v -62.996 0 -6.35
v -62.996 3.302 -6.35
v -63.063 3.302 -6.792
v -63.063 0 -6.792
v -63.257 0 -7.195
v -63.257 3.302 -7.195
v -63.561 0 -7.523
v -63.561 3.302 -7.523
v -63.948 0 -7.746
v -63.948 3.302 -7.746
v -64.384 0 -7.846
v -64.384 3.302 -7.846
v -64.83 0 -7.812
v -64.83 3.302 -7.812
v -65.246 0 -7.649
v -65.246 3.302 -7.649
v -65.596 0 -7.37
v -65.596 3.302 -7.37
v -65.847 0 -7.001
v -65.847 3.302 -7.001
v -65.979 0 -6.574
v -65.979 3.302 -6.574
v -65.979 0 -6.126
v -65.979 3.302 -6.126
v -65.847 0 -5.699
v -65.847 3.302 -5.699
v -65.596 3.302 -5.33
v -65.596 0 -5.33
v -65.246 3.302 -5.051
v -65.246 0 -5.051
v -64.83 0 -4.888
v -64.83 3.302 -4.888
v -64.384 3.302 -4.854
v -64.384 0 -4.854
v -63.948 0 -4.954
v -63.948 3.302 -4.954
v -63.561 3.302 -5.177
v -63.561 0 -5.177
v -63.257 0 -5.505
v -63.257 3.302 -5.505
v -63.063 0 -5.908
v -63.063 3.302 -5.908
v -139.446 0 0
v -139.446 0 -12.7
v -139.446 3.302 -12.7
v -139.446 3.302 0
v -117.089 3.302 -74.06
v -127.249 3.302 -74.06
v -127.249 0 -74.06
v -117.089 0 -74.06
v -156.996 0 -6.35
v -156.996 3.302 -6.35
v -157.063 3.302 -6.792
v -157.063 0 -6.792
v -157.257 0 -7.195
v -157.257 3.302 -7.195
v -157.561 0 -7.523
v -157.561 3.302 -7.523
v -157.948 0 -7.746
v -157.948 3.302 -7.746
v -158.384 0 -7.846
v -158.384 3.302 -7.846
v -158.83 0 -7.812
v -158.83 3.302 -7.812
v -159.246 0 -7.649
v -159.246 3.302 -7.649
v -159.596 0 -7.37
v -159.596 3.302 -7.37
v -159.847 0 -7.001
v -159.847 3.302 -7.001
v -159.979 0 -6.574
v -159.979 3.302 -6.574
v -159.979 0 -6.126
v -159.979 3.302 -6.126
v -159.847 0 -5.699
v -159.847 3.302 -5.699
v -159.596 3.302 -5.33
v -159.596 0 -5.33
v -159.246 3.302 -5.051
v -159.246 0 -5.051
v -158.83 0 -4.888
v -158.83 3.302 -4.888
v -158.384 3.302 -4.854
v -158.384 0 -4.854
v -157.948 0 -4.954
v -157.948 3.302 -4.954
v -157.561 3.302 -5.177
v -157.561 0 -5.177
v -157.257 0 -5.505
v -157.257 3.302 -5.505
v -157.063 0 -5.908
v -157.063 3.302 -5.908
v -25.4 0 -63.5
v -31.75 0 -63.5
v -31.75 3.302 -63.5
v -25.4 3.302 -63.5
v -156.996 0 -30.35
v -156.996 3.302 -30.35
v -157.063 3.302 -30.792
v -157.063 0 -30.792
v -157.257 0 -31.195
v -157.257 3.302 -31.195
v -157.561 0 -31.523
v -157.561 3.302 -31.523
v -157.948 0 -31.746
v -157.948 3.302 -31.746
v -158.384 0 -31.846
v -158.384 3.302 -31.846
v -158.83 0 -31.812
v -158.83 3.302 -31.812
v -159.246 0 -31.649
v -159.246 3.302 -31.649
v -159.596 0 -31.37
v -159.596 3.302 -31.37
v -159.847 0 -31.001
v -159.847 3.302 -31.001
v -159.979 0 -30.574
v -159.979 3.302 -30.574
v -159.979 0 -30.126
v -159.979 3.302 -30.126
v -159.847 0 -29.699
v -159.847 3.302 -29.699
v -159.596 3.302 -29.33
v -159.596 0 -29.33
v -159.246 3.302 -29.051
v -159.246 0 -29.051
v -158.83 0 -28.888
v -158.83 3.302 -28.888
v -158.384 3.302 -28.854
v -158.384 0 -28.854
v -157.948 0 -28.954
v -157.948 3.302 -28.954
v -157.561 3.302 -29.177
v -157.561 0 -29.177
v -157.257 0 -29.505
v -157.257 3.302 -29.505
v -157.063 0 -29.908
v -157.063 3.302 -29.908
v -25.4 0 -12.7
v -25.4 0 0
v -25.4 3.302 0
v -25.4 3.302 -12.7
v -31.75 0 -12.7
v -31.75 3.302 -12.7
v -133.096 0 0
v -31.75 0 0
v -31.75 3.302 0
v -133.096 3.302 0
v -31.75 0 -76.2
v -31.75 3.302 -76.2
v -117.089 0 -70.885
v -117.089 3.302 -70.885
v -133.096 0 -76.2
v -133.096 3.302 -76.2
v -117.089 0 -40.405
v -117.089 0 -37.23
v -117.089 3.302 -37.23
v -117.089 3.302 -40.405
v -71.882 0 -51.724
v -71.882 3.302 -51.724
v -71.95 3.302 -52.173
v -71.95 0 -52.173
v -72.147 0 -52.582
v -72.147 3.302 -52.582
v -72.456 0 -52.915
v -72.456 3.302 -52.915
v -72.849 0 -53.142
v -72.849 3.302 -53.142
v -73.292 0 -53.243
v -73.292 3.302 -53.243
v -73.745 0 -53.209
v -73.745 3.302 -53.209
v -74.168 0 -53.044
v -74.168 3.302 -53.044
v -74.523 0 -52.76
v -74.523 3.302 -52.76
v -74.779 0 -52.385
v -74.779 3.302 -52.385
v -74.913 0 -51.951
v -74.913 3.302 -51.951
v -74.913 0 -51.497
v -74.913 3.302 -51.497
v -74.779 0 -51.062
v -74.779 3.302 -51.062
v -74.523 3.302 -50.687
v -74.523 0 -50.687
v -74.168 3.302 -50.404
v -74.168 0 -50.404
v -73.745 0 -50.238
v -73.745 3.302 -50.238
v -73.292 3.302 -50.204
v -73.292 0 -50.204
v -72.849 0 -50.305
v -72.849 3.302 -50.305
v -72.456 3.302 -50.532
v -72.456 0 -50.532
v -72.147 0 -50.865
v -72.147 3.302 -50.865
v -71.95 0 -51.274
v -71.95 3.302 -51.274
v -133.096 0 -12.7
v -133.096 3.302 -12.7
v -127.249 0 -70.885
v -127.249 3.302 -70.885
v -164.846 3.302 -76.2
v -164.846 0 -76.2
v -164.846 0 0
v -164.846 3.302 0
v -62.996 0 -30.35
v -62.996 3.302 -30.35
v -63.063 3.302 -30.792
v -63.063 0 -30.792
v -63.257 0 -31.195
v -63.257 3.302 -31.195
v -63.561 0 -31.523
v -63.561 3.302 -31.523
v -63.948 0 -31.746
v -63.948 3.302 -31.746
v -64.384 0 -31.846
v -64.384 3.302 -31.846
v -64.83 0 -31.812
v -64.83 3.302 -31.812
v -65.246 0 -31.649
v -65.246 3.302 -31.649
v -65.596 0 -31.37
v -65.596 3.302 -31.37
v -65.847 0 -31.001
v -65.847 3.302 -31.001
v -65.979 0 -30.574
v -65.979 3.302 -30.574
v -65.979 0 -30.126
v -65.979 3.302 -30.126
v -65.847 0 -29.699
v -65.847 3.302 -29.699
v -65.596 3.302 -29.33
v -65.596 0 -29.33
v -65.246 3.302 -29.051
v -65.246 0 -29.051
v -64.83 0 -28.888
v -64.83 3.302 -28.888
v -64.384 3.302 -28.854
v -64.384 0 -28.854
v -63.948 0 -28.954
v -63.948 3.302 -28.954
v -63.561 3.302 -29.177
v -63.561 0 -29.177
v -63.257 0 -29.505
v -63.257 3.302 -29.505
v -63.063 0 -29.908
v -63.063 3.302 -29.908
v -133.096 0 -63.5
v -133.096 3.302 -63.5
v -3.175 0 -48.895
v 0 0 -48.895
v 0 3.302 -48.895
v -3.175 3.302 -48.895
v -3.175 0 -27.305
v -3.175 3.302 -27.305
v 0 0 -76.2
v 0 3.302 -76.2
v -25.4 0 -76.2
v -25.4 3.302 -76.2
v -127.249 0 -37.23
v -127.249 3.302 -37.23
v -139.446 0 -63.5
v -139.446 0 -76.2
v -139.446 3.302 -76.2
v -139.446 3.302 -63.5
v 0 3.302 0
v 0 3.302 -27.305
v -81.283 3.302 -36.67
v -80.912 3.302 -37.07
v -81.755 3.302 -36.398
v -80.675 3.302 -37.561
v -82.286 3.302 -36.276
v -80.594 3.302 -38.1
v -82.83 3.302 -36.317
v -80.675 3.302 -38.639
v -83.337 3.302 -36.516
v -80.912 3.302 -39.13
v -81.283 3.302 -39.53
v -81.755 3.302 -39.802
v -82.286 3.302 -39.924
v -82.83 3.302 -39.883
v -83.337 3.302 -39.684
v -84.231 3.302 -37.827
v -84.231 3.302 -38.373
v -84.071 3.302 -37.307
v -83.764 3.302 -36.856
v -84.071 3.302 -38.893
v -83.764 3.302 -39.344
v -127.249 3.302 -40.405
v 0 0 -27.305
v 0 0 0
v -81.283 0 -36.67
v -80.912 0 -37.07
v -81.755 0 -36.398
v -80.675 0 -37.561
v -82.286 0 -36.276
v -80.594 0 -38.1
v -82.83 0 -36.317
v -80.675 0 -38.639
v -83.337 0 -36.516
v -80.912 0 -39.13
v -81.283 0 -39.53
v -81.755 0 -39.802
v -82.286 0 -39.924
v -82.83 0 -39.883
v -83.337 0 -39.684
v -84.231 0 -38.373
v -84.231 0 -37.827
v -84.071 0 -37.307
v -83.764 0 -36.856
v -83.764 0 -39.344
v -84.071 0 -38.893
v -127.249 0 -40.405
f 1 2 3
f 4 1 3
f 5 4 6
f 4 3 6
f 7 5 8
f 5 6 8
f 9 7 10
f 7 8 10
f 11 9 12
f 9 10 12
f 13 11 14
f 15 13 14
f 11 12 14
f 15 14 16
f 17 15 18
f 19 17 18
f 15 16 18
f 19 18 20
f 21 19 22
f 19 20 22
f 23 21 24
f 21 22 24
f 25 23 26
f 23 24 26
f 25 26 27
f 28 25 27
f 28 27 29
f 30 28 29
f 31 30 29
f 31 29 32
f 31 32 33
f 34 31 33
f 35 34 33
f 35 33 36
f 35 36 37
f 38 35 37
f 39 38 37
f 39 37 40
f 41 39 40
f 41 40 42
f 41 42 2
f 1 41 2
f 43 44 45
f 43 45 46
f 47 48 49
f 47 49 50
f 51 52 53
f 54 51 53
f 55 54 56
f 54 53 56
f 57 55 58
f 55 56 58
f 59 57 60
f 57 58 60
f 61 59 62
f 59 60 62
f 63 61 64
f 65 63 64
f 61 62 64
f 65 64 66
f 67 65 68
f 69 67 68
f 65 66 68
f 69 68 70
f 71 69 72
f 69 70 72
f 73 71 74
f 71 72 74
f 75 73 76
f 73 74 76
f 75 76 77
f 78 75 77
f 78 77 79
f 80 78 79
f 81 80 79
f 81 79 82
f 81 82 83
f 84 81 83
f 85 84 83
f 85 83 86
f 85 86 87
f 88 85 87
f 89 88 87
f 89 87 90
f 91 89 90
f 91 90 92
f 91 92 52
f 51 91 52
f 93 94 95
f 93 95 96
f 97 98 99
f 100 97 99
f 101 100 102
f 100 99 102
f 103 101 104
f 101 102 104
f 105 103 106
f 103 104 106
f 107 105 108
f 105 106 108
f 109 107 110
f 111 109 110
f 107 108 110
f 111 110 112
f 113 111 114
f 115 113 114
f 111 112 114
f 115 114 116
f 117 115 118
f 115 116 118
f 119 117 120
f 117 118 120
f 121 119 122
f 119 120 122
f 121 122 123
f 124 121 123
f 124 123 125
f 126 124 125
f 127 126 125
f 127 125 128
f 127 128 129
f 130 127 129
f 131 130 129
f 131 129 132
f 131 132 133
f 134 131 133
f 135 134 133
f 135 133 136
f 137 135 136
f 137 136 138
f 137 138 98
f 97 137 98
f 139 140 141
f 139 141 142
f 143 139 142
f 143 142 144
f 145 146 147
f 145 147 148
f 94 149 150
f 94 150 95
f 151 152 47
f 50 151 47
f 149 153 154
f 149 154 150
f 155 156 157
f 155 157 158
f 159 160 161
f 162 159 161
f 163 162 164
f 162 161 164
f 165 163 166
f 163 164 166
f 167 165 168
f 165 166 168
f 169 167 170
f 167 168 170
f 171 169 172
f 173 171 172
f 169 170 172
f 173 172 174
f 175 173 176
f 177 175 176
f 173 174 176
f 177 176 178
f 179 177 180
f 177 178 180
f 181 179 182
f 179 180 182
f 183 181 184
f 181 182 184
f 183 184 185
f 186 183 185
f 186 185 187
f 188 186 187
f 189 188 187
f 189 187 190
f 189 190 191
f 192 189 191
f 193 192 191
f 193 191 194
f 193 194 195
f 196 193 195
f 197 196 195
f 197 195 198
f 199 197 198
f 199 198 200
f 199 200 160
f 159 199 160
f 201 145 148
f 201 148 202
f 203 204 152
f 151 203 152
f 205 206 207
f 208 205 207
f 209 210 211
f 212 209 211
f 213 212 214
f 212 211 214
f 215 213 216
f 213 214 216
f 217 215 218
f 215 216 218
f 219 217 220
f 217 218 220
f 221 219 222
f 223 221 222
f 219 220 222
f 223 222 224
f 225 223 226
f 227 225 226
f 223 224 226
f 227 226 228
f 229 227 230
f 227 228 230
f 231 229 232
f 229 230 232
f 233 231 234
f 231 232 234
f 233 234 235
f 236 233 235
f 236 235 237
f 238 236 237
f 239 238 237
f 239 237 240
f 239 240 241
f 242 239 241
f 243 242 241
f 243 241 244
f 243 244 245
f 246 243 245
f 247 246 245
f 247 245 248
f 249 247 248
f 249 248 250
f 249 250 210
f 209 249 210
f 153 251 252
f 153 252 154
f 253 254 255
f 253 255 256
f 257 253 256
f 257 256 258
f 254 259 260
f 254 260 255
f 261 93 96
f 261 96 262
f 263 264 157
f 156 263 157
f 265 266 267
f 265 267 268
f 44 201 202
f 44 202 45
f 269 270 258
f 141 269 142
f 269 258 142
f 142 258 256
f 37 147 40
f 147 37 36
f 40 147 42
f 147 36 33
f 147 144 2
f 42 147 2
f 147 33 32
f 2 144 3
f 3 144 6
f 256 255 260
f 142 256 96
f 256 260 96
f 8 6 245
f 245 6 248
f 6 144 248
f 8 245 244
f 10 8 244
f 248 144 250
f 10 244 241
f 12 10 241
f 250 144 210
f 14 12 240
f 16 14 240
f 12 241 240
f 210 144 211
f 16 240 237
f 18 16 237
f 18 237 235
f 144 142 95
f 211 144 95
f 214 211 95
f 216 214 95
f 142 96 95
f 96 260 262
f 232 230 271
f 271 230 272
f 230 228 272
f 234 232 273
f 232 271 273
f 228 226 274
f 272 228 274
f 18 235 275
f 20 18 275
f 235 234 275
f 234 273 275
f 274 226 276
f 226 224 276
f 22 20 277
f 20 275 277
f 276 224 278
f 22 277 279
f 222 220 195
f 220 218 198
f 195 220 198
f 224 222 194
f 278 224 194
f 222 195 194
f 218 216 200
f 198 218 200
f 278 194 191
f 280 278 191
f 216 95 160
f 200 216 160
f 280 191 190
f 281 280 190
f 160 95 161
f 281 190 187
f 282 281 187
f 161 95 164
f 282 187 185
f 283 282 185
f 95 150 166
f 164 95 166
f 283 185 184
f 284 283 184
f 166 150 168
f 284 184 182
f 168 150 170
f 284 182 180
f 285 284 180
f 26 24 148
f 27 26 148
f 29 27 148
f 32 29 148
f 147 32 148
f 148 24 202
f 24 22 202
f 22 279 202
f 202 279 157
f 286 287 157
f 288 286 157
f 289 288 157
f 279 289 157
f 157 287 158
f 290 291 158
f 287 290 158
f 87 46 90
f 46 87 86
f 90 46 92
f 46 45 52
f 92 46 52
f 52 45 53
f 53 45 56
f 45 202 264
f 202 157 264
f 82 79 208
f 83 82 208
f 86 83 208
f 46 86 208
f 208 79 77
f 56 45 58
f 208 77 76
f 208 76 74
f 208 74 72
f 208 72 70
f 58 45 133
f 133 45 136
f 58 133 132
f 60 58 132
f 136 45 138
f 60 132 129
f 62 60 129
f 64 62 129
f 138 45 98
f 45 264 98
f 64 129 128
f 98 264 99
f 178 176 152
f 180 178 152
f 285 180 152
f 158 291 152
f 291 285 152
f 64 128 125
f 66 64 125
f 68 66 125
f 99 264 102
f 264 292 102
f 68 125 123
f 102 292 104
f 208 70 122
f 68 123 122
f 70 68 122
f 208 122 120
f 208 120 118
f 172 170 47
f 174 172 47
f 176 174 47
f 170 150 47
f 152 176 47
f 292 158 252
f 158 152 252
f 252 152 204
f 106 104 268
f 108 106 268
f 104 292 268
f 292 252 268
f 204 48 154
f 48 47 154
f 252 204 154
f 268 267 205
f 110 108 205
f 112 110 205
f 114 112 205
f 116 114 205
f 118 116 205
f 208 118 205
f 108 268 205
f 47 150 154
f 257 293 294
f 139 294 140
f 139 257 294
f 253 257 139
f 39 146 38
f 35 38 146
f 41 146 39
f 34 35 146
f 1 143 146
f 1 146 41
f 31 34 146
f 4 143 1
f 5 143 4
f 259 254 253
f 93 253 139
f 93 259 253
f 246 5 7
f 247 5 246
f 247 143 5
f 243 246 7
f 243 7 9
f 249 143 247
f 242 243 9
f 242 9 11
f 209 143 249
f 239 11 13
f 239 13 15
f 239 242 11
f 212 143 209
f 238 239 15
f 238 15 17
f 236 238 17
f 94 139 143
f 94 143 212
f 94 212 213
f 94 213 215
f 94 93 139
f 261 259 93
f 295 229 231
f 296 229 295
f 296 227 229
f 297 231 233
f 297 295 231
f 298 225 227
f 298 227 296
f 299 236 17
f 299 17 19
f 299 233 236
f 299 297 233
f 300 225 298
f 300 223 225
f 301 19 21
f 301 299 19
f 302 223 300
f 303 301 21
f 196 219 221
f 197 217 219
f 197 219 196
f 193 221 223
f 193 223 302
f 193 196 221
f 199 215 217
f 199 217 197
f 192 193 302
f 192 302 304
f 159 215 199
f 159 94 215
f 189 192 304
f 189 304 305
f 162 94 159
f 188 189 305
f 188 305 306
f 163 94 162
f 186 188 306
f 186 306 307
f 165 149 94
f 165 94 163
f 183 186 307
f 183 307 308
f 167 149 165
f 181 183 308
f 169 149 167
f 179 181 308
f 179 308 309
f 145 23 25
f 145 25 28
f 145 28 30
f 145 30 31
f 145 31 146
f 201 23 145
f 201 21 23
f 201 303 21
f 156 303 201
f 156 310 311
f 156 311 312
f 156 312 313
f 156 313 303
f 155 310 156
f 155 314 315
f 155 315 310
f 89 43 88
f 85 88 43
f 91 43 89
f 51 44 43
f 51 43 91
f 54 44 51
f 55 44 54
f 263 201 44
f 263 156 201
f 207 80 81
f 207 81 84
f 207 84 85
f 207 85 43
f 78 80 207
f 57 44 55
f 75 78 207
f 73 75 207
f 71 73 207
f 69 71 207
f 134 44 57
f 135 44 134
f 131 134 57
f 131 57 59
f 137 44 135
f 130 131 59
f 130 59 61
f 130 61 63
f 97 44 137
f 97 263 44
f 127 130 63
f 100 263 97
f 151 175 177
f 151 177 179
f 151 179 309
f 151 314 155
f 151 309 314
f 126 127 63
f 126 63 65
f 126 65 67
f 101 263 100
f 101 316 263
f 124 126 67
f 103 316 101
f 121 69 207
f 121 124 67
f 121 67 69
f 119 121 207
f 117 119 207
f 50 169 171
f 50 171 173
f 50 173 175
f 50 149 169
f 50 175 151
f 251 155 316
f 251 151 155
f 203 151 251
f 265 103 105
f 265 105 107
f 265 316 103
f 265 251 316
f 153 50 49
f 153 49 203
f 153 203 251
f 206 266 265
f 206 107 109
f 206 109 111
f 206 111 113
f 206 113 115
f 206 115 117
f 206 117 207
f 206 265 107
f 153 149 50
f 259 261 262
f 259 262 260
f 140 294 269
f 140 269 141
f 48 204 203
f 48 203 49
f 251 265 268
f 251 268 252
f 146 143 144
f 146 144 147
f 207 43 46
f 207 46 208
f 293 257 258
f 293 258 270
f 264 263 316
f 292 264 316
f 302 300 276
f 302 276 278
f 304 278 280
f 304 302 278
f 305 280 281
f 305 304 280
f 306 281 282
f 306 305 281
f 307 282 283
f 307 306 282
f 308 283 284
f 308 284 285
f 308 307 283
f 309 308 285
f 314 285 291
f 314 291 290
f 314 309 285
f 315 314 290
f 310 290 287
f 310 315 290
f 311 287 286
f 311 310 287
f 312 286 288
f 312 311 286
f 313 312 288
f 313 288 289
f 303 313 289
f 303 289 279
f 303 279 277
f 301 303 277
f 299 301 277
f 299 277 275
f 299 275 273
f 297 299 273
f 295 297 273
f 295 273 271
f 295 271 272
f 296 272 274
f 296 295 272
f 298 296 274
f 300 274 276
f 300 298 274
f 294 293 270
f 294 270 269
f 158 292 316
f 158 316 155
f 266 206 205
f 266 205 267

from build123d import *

# Parameters (mm, degrees)
SKETCH1_R           = 1.8288
BOSS_EXTRUDE1_DEPTH = 3.302
SKETCH2_R           = 1.5
CUT_EXTRUDE1_DEPTH  = 4.302
SKETCH3_R           = 1.524
SKETCH3_W           = 10.16
SKETCH3_H           = 3.175
CUT_EXTRUDE2_DEPTH  = 4.302


with BuildPart() as part:
    # Sketch1 → Boss-Extrude1 (new body)
    with BuildSketch(Plane(origin=(0, 0, 0), x_dir=(1, 0, 0), z_dir=(0, 1, 0))):
        Polygon((-164.846, 76.2), (-139.446, 76.2), (-139.446, 63.5), (-133.096, 63.5), (-133.096, 76.2), (-31.75, 76.2), (-31.75, 63.5), (-25.4, 63.5), (-25.4, 76.2), (0, 76.2), (0, 48.895), (-3.175, 48.895), (-3.175, 27.305), (0, 27.305), (0, 0), (-25.4, 0), (-25.4, 12.7), (-31.75, 12.7), (-31.75, 0), (-133.096, 0), (-133.096, 12.7), (-139.446, 12.7), (-139.446, 0), (-164.846, 0), (-164.846, 27.305), (-164.846, 48.895), align=None)
        with Locations((-82.423, 38.1)):
            Circle(SKETCH1_R, mode=Mode.SUBTRACT)
    extrude(amount=BOSS_EXTRUDE1_DEPTH)

    # Sketch2 → Cut-Extrude1 (cut, through all)
    with BuildSketch(Plane(origin=(0, 3.302, 0), x_dir=(1, 0, 0), z_dir=(0, 1, 0))):
        with Locations((-158.496, 30.35)):
            Circle(SKETCH2_R)
        with Locations((-158.496, 6.35)):
            Circle(SKETCH2_R)
        with Locations((-64.496, 6.35)):
            Circle(SKETCH2_R)
        with Locations((-64.496, 30.35)):
            Circle(SKETCH2_R)
    extrude(amount=-CUT_EXTRUDE1_DEPTH, mode=Mode.SUBTRACT)

    # Sketch3 → Cut-Extrude2 (cut, through all)
    with BuildSketch(Plane(origin=(0, 3.302, 0), x_dir=(1, 0, 0), z_dir=(0, 1, 0))):
        with Locations((-73.406, 51.723686304)):
            Circle(SKETCH3_R)
        with Locations((-122.169322677, 38.81724188)):
            Rectangle(SKETCH3_W, SKETCH3_H)
        with Locations((-122.169322677, 72.47224188)):
            Rectangle(SKETCH3_W, SKETCH3_H)
    extrude(amount=-CUT_EXTRUDE2_DEPTH, mode=Mode.SUBTRACT)


solid = part.part
